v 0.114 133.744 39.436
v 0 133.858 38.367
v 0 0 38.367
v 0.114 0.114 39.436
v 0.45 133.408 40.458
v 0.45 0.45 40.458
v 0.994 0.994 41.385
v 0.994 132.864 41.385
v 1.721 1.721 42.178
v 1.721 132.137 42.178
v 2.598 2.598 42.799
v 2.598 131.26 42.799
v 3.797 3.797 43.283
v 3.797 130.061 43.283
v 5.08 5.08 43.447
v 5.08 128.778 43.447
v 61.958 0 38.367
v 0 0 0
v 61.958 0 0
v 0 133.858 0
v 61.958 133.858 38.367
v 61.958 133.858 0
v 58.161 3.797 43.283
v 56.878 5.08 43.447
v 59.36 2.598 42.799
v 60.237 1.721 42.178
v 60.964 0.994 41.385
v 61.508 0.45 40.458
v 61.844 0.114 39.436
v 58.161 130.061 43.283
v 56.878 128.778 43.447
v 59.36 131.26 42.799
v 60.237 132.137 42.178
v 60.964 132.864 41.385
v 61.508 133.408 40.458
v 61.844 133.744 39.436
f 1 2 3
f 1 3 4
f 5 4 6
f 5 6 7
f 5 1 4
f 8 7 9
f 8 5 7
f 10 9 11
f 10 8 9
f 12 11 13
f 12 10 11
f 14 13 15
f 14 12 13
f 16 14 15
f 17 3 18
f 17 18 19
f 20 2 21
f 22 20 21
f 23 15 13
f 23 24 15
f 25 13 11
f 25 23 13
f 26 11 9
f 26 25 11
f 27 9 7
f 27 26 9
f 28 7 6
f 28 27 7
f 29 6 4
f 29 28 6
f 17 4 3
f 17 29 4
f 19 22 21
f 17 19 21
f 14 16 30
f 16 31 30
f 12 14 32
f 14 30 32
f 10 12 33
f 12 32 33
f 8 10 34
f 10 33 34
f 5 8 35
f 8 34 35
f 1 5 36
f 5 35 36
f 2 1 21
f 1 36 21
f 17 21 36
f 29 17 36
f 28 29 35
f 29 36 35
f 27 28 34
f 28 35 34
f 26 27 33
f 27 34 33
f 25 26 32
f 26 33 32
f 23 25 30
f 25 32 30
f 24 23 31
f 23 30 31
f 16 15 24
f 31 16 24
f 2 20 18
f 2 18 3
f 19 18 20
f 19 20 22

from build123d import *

# Parameters (mm, degrees)
F0_W     = 61.95803
F0_H     = 43.447111
F1_DEPTH = 133.858
F2_R     = 5.08


with BuildPart() as f1:
    # F0 (on Front) → F1 (new body)
    with BuildSketch(Plane.XZ):
        with Locations((30.979015, 21.723555)):
            Rectangle(F0_W, F0_H)
    extrude(amount=-F1_DEPTH)

    # F2
    f2_edges = [f1.edges().sort_by_distance(p)[0] for p in [
        (61.95803, 66.929, 43.447111),
        (0, 66.929, 43.447111),
        (30.979015, 0, 43.447111),
        (30.979015, 133.858, 43.447111),
    ]]
    fillet(f2_edges, radius=F2_R)


solid = f1.part
